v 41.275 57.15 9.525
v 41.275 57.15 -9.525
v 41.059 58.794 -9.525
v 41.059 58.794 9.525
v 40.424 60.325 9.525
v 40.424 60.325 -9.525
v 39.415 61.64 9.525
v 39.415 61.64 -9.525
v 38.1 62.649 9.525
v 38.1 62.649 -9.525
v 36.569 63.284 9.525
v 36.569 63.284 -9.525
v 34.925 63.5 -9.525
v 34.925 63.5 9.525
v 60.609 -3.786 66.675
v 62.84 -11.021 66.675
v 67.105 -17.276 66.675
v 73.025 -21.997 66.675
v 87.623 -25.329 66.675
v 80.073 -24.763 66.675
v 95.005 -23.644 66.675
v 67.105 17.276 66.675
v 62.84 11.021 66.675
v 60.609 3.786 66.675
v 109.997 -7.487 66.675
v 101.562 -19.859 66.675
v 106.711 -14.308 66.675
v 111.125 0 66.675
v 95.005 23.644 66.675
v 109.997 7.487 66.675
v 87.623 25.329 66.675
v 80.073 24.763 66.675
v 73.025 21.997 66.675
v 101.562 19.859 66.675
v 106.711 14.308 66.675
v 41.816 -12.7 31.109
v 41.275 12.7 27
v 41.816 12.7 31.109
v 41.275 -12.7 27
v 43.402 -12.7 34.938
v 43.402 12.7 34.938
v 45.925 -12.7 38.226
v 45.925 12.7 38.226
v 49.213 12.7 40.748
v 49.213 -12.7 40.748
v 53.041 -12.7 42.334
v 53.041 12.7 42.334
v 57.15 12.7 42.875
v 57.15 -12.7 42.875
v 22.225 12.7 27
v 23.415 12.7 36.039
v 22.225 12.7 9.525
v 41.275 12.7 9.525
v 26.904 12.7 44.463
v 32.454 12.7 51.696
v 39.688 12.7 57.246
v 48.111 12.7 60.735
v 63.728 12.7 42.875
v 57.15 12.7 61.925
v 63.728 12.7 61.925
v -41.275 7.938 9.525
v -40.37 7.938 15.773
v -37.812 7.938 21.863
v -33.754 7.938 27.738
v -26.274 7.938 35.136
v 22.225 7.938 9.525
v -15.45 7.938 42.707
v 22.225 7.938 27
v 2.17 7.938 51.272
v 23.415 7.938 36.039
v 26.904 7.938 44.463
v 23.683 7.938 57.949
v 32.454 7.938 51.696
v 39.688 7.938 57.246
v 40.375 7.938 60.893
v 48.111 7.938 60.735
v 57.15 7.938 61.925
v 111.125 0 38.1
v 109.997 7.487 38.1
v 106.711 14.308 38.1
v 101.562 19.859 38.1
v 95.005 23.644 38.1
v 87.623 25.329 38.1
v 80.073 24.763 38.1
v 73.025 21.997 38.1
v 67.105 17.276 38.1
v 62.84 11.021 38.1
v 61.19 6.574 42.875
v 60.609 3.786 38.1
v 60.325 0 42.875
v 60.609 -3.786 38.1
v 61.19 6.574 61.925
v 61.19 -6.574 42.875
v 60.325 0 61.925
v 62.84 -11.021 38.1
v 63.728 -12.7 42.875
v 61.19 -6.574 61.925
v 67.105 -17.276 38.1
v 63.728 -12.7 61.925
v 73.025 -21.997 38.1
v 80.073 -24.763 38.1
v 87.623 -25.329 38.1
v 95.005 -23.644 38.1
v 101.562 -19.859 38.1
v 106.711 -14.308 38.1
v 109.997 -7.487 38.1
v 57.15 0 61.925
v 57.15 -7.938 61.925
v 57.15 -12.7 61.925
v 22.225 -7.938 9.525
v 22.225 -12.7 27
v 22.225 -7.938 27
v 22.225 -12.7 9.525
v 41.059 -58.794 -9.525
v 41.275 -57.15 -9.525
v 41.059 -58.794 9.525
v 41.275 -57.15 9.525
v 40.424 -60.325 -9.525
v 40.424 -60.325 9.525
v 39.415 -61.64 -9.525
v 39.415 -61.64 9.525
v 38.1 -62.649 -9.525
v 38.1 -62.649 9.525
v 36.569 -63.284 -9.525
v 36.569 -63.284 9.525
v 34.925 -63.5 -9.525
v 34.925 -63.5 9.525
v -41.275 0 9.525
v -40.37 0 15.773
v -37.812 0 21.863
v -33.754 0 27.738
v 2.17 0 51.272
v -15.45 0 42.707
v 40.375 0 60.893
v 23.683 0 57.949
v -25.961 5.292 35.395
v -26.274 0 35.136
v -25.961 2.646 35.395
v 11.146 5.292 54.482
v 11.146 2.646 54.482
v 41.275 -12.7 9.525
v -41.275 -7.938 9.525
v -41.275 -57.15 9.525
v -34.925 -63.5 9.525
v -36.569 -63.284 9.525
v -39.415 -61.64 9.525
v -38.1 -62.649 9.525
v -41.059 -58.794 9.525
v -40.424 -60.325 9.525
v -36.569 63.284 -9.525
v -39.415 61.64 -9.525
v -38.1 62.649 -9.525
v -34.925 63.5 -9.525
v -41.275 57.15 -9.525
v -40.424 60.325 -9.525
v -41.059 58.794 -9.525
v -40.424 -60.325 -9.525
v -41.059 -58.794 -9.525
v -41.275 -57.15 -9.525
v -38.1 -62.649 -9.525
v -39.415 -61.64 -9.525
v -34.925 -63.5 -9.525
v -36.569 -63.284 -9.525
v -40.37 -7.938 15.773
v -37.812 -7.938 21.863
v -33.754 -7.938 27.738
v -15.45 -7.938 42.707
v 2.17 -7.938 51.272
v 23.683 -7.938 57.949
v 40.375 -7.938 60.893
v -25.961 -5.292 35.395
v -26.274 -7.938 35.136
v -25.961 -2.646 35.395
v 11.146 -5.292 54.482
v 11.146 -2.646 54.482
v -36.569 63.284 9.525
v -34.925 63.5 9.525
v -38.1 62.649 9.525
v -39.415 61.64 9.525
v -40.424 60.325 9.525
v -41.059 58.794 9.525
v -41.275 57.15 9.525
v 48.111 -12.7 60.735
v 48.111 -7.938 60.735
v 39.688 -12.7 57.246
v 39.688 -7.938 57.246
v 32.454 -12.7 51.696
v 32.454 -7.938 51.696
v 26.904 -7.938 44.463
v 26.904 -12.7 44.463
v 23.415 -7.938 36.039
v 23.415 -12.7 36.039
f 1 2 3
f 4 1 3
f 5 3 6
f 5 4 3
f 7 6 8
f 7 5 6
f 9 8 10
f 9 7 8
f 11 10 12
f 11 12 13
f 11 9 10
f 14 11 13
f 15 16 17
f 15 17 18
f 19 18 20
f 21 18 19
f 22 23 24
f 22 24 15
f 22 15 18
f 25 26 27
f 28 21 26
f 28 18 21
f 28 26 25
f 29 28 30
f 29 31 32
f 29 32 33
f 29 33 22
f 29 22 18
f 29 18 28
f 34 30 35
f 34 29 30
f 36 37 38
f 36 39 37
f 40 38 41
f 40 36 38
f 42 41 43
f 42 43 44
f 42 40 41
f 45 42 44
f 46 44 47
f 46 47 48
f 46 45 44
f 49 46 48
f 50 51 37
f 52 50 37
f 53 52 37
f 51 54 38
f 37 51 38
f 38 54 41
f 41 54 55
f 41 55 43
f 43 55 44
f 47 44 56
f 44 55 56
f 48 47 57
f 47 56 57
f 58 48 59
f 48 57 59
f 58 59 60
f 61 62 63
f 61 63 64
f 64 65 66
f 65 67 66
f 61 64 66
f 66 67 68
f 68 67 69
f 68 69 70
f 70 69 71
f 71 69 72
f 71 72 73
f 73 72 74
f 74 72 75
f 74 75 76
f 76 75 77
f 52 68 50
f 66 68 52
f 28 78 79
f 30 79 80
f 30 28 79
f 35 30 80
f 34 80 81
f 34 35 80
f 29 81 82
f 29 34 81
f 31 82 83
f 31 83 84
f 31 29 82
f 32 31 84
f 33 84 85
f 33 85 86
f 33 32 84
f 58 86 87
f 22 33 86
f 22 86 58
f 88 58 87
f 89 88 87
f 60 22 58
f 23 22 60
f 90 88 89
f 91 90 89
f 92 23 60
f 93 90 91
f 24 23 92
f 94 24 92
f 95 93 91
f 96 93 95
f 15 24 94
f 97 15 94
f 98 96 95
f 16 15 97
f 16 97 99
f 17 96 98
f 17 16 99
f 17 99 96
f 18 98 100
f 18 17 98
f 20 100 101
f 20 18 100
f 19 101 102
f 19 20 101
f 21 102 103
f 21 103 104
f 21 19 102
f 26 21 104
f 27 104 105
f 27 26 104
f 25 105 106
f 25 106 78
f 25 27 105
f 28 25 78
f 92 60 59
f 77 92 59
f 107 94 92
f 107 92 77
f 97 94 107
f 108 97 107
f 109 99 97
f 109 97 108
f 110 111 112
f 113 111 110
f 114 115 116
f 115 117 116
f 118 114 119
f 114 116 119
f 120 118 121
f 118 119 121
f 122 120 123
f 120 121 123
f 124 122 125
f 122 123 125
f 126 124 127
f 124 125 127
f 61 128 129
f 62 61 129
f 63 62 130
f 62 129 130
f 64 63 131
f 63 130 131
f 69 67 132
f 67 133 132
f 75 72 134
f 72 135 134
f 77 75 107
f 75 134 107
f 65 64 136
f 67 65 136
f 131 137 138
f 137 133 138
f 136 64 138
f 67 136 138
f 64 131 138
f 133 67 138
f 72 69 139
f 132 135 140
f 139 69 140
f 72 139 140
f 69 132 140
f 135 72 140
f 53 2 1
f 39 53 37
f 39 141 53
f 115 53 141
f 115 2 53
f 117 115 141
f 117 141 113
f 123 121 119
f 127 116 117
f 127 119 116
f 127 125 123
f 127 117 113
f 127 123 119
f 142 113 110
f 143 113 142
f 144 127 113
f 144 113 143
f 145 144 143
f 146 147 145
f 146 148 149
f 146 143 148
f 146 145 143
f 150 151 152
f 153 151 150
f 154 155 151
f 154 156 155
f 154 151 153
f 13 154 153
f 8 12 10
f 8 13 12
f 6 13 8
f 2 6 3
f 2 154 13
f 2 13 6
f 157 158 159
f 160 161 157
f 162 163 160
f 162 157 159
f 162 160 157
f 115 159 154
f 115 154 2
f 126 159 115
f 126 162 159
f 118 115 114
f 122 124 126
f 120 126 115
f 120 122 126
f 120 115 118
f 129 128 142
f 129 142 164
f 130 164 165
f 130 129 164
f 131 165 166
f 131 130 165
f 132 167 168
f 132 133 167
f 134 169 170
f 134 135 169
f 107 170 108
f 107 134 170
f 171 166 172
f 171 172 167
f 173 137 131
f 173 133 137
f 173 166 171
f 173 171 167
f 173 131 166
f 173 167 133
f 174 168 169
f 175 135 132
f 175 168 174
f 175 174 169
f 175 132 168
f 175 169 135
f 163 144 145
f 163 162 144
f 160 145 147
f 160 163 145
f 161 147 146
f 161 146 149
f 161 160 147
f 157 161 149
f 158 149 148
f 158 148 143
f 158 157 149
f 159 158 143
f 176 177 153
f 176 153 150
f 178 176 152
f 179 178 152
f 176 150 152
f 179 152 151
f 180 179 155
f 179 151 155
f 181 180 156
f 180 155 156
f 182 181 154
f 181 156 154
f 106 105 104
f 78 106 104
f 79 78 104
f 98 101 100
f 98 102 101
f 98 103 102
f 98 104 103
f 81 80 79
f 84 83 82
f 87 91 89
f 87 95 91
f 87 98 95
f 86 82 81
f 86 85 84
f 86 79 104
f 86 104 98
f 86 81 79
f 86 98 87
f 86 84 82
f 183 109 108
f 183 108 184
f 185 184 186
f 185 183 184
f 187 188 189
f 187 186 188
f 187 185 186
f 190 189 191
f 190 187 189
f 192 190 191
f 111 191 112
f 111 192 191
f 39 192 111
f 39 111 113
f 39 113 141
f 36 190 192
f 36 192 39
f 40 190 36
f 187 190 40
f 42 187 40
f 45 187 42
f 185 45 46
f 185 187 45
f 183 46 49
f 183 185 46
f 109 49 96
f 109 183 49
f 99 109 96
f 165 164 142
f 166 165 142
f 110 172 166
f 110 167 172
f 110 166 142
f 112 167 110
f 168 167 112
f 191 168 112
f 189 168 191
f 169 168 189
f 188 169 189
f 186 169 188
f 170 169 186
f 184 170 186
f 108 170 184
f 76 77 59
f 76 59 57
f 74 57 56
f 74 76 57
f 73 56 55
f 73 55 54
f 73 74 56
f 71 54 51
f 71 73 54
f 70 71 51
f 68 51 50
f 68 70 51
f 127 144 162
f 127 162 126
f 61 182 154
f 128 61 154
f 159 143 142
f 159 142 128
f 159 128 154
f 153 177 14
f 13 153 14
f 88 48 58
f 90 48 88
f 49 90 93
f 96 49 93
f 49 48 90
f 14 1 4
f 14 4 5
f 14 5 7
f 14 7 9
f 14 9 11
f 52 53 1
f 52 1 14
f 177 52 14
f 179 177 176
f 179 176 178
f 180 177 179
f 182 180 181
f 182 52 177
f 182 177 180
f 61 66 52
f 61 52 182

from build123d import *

# Parameters (mm, degrees)
F1_DEPTH = 63.5
F0_W     = 25.4
F0_H     = 19.05
F2_DEPTH = 12.7
F3_DEPTH = 7.9375
F5_R     = 6.35


with BuildPart() as f1:
    # F0 (on Front) → F1 (new body, symmetric)
    with BuildSketch(Plane.XZ):
        Polygon((41.275, -9.525), (41.275, 9.525), (22.225, 9.525), (-41.275, 9.525), (-41.275, -9.525), align=None)
    extrude(amount=F1_DEPTH, both=True)



with BuildPart() as f2:
    # F0 (on Front) → F2 (new body, symmetric)
    with BuildSketch(Plane.XZ):
        with Locations((73.025, 52.4002)):
            Rectangle(F0_W, F0_H)
        with BuildLine():
            Line((22.225, 9.525), (41.275, 9.525))
            Line((41.275, 9.525), (41.275, 27.0002))
            ThreePointArc((41.275, 27.0002), (45.9246798487, 38.2255201513), (57.15, 42.8752))
            Line((57.15, 42.8752), (60.325, 42.8752))
            Line((60.325, 42.8752), (60.325, 61.9252))
            Line((60.325, 61.9252), (57.15, 61.9252))
            ThreePointArc((57.15, 61.9252), (32.4542956671, 51.6959043329), (22.225, 27.0002))
            Line((22.225, 27.0002), (22.225, 9.525))
        make_face()
    extrude(amount=F2_DEPTH, both=True)


with BuildPart() as f1_1:
    add(f1.part)

    add(f2.part)  # F3 merges F2
    # F0 (on Front) → F3 (join, symmetric)
    with BuildSketch(Plane.XZ):
        with BuildLine():
            Line((-41.275, 9.525), (22.225, 9.525))
            Line((22.225, 9.525), (22.225, 27.0002))
            ThreePointArc((22.225, 27.0002), (32.4542956671, 51.6959043329), (57.15, 61.9252))
            add(Edge.make_bspline(
                [(-41.275, 9.525), (-41.1560833454, 37.1647924185), (10.9962709248, 61.9252), (57.15, 61.9252)],
                knots=[0, 0, 0, 0, 111.5045361635, 111.5045361635, 111.5045361635, 111.5045361635], degree=3))
        make_face()
    extrude(amount=F3_DEPTH, both=True)

    # F0 (on Front) → F4 (revolve)
    with BuildSketch(Plane.XZ):
        Polygon((85.725, 61.9252), (85.725, 42.8752), (85.725, 38.1), (111.125, 38.1), (111.125, 66.675), (85.725, 66.675), align=None)
    revolve(axis=Axis((85.725, 0, 52.3875), (0, 0, 1)))

    # F5
    f5_edges = [f1_1.edges().sort_by_distance(p)[0] for p in [
        (-41.275, -63.5, 0),
        (41.275, -63.5, 0),
        (41.275, 63.5, 0),
        (-41.275, 63.5, 0),
    ]]
    fillet(f5_edges, radius=F5_R)


solid = f1_1.part
